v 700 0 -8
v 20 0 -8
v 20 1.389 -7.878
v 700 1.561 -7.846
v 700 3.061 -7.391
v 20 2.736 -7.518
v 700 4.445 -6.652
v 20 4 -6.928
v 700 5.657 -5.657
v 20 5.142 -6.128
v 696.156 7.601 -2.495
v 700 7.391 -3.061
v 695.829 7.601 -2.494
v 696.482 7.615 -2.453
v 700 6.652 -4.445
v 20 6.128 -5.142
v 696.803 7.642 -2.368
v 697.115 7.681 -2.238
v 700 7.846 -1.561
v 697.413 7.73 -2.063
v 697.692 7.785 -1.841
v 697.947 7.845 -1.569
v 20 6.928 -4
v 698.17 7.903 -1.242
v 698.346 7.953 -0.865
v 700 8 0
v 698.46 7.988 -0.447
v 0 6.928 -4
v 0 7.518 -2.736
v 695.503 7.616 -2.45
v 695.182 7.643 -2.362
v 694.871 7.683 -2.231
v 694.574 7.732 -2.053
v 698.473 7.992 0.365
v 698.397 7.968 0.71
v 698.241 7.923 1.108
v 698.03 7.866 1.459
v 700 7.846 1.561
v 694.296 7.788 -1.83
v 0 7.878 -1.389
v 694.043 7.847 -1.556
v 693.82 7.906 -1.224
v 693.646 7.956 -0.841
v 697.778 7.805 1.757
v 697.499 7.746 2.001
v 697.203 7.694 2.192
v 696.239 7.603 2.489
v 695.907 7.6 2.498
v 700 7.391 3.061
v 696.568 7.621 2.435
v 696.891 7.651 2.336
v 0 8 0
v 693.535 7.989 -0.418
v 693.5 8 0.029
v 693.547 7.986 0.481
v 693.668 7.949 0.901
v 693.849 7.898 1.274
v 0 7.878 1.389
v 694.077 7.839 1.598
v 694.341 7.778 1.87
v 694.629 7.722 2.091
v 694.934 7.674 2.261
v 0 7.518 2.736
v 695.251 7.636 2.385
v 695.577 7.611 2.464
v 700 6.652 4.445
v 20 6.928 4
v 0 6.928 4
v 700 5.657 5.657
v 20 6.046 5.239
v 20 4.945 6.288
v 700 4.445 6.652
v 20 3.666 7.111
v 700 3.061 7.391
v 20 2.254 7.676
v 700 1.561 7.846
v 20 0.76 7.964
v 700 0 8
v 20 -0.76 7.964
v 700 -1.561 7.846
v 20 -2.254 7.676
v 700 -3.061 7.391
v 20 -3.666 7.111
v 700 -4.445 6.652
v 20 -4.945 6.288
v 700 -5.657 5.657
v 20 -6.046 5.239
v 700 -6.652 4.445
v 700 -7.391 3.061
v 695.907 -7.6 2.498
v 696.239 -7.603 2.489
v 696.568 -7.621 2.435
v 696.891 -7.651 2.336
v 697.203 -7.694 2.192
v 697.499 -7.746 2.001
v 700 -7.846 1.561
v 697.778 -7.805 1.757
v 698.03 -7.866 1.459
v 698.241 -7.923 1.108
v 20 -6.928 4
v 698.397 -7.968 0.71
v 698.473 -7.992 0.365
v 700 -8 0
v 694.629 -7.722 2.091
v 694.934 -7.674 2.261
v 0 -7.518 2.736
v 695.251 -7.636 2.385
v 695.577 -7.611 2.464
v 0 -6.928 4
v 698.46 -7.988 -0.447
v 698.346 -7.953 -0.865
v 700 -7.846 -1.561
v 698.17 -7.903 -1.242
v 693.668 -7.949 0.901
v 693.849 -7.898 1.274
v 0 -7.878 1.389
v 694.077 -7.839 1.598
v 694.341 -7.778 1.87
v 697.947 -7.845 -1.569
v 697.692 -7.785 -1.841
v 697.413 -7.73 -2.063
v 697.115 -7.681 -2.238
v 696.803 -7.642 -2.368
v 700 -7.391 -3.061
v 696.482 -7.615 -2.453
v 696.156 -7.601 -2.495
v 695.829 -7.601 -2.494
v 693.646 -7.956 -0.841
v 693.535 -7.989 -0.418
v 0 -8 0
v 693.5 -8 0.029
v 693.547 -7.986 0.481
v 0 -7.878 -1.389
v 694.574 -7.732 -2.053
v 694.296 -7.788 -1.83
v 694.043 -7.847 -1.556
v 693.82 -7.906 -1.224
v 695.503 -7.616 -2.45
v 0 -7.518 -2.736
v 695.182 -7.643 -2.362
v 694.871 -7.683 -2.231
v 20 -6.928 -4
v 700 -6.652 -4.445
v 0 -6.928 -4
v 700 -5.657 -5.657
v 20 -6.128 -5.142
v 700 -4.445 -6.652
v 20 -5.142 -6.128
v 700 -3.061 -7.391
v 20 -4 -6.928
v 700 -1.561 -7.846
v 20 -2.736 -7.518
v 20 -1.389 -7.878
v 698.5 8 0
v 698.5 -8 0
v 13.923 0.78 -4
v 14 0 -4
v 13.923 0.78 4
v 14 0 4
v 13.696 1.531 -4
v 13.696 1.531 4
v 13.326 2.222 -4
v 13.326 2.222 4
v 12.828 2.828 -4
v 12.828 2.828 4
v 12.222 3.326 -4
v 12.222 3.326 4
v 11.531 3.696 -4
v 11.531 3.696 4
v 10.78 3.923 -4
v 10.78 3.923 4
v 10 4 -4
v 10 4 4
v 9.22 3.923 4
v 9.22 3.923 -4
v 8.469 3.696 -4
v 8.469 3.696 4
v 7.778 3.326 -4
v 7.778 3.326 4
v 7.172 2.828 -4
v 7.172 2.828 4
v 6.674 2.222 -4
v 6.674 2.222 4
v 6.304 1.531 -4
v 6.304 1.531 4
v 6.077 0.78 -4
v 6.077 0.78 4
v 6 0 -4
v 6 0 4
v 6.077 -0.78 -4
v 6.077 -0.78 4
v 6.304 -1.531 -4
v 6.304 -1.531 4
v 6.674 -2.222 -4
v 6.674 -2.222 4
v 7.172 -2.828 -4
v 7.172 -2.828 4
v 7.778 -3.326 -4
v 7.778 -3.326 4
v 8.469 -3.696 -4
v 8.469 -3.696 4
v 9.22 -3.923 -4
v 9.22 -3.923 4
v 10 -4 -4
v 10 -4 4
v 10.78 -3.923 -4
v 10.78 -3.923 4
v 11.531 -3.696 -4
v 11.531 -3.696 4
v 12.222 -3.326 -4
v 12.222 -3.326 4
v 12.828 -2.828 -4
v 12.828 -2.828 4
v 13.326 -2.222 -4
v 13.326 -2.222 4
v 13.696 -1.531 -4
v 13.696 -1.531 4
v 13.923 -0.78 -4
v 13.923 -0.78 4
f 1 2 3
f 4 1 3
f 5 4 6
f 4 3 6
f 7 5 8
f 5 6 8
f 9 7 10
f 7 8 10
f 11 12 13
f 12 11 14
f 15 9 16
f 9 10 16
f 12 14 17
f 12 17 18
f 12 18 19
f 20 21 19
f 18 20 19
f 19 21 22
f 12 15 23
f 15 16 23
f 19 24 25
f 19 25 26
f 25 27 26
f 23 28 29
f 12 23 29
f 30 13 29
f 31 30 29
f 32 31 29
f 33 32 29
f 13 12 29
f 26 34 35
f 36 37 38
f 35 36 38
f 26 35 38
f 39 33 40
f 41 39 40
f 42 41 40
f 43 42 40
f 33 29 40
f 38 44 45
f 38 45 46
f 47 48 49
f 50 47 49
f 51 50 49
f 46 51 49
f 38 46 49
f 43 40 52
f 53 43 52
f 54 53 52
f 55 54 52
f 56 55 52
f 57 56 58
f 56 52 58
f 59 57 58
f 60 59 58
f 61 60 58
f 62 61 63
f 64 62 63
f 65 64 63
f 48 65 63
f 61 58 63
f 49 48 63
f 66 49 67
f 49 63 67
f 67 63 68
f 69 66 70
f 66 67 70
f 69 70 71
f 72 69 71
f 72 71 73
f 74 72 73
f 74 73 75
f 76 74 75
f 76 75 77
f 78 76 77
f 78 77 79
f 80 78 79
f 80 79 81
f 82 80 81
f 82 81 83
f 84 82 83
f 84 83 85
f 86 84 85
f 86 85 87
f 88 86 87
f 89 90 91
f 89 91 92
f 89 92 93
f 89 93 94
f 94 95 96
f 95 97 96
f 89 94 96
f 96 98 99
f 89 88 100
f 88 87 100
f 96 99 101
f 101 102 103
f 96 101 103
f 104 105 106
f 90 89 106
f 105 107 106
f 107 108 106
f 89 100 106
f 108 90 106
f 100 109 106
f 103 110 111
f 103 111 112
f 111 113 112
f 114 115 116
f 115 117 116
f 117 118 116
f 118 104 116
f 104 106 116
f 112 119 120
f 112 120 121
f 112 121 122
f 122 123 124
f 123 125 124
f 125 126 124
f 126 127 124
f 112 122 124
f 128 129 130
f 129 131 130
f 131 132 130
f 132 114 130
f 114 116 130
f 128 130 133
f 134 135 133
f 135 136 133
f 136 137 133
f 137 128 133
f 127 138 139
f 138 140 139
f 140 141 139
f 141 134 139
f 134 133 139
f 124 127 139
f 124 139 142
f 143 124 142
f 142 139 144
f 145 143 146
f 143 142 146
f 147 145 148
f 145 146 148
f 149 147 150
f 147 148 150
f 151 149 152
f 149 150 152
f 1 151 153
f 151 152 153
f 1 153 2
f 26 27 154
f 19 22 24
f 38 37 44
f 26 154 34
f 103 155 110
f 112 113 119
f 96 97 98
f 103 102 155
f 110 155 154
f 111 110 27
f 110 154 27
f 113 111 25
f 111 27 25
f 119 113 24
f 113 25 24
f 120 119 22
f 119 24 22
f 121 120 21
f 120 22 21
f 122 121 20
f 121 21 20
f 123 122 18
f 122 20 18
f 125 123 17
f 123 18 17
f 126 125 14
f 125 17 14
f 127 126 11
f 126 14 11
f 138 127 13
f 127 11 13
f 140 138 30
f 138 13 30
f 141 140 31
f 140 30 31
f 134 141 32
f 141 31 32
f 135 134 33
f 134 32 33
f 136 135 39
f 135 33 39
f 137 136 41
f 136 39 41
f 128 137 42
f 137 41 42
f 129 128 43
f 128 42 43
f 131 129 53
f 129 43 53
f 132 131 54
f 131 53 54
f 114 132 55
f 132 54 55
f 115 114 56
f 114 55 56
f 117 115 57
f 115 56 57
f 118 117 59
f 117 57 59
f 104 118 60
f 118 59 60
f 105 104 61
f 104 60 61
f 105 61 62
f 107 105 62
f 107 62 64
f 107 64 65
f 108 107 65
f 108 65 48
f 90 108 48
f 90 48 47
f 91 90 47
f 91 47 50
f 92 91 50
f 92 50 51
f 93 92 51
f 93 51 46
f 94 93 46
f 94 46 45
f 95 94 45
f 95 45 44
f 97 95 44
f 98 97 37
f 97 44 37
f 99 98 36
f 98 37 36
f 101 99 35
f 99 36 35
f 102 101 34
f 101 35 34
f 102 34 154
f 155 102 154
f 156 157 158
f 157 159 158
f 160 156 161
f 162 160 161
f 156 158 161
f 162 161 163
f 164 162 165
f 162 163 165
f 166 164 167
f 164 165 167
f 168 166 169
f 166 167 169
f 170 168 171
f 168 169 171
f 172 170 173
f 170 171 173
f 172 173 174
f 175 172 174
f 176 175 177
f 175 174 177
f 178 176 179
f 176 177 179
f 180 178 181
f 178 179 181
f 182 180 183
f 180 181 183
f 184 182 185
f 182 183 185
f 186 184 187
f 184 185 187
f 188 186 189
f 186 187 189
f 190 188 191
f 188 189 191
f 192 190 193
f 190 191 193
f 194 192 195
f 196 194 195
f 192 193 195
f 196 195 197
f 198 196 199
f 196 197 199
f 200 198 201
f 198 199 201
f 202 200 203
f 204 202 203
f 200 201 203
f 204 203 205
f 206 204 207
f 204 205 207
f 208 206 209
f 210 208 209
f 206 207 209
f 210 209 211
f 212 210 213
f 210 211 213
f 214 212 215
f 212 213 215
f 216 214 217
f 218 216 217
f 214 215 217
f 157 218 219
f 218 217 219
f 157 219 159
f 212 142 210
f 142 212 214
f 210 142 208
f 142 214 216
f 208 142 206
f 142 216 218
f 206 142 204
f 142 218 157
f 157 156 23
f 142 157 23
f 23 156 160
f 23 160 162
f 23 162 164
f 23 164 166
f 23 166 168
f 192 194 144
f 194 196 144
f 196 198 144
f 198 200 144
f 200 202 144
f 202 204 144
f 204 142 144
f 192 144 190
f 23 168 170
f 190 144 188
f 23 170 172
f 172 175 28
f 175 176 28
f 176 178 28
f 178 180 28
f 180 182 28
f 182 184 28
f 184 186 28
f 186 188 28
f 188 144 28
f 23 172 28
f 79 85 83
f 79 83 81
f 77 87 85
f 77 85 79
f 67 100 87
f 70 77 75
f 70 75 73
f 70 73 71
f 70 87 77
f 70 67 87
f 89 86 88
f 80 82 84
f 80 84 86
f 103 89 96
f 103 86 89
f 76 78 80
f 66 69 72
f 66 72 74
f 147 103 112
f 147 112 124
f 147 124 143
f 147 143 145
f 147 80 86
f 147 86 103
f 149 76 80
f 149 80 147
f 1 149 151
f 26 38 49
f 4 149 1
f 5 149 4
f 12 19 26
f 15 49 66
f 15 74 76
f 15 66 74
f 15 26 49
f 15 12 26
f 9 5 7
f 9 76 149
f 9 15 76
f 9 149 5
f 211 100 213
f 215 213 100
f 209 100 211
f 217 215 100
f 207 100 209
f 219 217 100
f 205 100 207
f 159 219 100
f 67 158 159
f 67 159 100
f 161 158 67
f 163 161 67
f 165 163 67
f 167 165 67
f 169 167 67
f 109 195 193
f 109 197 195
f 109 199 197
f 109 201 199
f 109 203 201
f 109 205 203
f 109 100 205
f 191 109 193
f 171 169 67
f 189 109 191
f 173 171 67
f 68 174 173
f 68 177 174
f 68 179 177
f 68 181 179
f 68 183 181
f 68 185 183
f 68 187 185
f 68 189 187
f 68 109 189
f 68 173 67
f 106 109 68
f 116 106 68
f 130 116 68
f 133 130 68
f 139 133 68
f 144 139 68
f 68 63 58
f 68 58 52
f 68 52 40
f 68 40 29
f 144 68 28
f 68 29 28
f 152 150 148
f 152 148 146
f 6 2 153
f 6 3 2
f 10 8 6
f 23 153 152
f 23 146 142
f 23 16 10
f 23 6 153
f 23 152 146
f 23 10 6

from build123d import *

# Parameters (mm, degrees)
SKETCH_1_R               = 8
EXTRUDE_1_DEPTH          = 700
SKETCH_2_R               = 4
CUT_EXTRUDE_1_DEPTH      = 9
CUT_EXTRUDE_1_DEPTH_BACK = 9
SKETCH_3_OUTSIDE_W       = 158.074
SKETCH_3_OUTSIDE_H       = 158.074
SKETCH_3_OUTSIDE_W_2     = 8
SKETCH_3_OUTSIDE_H_2     = 20
CUT_EXTRUDE_2_DEPTH      = 20
SKETCH_4_R               = 2.5
CUT_EXTRUDE_3_DEPTH      = 10


with BuildPart() as part:
    # 草图1 → 凸台-拉伸1 (new body)
    with BuildSketch(Plane(origin=(0, 0, 0), x_dir=(0, 0, -1), z_dir=(1, 0, 0))):
        Circle(SKETCH_1_R)
    extrude(amount=EXTRUDE_1_DEPTH)

    # 草图2 → 切除-拉伸1 (cut, two sides)
    with BuildSketch(Plane.XY) as cut_extrude_1_sk:
        with Locations((10, 0)):
            Circle(SKETCH_2_R)
    extrude(amount=CUT_EXTRUDE_1_DEPTH, mode=Mode.SUBTRACT)
    extrude(cut_extrude_1_sk.sketch, amount=-CUT_EXTRUDE_1_DEPTH_BACK, mode=Mode.SUBTRACT)

    # 草图3 outside → 切除-拉伸2 (cut)
    with BuildSketch(Plane.ZY):
        Rectangle(SKETCH_3_OUTSIDE_W, SKETCH_3_OUTSIDE_H)
        Rectangle(SKETCH_3_OUTSIDE_W_2, SKETCH_3_OUTSIDE_H_2, mode=Mode.SUBTRACT)
    extrude(amount=-CUT_EXTRUDE_2_DEPTH, mode=Mode.SUBTRACT)

    # 草图4 → 切除-拉伸3 (cut, symmetric)
    with BuildSketch(Plane(origin=(0, 0, 0), x_dir=(1, 0, 0), z_dir=(0, 1, 0))):
        with Locations((696, 0)):
            Circle(SKETCH_4_R)
    extrude(amount=CUT_EXTRUDE_3_DEPTH, both=True, mode=Mode.SUBTRACT)


solid = part.part
